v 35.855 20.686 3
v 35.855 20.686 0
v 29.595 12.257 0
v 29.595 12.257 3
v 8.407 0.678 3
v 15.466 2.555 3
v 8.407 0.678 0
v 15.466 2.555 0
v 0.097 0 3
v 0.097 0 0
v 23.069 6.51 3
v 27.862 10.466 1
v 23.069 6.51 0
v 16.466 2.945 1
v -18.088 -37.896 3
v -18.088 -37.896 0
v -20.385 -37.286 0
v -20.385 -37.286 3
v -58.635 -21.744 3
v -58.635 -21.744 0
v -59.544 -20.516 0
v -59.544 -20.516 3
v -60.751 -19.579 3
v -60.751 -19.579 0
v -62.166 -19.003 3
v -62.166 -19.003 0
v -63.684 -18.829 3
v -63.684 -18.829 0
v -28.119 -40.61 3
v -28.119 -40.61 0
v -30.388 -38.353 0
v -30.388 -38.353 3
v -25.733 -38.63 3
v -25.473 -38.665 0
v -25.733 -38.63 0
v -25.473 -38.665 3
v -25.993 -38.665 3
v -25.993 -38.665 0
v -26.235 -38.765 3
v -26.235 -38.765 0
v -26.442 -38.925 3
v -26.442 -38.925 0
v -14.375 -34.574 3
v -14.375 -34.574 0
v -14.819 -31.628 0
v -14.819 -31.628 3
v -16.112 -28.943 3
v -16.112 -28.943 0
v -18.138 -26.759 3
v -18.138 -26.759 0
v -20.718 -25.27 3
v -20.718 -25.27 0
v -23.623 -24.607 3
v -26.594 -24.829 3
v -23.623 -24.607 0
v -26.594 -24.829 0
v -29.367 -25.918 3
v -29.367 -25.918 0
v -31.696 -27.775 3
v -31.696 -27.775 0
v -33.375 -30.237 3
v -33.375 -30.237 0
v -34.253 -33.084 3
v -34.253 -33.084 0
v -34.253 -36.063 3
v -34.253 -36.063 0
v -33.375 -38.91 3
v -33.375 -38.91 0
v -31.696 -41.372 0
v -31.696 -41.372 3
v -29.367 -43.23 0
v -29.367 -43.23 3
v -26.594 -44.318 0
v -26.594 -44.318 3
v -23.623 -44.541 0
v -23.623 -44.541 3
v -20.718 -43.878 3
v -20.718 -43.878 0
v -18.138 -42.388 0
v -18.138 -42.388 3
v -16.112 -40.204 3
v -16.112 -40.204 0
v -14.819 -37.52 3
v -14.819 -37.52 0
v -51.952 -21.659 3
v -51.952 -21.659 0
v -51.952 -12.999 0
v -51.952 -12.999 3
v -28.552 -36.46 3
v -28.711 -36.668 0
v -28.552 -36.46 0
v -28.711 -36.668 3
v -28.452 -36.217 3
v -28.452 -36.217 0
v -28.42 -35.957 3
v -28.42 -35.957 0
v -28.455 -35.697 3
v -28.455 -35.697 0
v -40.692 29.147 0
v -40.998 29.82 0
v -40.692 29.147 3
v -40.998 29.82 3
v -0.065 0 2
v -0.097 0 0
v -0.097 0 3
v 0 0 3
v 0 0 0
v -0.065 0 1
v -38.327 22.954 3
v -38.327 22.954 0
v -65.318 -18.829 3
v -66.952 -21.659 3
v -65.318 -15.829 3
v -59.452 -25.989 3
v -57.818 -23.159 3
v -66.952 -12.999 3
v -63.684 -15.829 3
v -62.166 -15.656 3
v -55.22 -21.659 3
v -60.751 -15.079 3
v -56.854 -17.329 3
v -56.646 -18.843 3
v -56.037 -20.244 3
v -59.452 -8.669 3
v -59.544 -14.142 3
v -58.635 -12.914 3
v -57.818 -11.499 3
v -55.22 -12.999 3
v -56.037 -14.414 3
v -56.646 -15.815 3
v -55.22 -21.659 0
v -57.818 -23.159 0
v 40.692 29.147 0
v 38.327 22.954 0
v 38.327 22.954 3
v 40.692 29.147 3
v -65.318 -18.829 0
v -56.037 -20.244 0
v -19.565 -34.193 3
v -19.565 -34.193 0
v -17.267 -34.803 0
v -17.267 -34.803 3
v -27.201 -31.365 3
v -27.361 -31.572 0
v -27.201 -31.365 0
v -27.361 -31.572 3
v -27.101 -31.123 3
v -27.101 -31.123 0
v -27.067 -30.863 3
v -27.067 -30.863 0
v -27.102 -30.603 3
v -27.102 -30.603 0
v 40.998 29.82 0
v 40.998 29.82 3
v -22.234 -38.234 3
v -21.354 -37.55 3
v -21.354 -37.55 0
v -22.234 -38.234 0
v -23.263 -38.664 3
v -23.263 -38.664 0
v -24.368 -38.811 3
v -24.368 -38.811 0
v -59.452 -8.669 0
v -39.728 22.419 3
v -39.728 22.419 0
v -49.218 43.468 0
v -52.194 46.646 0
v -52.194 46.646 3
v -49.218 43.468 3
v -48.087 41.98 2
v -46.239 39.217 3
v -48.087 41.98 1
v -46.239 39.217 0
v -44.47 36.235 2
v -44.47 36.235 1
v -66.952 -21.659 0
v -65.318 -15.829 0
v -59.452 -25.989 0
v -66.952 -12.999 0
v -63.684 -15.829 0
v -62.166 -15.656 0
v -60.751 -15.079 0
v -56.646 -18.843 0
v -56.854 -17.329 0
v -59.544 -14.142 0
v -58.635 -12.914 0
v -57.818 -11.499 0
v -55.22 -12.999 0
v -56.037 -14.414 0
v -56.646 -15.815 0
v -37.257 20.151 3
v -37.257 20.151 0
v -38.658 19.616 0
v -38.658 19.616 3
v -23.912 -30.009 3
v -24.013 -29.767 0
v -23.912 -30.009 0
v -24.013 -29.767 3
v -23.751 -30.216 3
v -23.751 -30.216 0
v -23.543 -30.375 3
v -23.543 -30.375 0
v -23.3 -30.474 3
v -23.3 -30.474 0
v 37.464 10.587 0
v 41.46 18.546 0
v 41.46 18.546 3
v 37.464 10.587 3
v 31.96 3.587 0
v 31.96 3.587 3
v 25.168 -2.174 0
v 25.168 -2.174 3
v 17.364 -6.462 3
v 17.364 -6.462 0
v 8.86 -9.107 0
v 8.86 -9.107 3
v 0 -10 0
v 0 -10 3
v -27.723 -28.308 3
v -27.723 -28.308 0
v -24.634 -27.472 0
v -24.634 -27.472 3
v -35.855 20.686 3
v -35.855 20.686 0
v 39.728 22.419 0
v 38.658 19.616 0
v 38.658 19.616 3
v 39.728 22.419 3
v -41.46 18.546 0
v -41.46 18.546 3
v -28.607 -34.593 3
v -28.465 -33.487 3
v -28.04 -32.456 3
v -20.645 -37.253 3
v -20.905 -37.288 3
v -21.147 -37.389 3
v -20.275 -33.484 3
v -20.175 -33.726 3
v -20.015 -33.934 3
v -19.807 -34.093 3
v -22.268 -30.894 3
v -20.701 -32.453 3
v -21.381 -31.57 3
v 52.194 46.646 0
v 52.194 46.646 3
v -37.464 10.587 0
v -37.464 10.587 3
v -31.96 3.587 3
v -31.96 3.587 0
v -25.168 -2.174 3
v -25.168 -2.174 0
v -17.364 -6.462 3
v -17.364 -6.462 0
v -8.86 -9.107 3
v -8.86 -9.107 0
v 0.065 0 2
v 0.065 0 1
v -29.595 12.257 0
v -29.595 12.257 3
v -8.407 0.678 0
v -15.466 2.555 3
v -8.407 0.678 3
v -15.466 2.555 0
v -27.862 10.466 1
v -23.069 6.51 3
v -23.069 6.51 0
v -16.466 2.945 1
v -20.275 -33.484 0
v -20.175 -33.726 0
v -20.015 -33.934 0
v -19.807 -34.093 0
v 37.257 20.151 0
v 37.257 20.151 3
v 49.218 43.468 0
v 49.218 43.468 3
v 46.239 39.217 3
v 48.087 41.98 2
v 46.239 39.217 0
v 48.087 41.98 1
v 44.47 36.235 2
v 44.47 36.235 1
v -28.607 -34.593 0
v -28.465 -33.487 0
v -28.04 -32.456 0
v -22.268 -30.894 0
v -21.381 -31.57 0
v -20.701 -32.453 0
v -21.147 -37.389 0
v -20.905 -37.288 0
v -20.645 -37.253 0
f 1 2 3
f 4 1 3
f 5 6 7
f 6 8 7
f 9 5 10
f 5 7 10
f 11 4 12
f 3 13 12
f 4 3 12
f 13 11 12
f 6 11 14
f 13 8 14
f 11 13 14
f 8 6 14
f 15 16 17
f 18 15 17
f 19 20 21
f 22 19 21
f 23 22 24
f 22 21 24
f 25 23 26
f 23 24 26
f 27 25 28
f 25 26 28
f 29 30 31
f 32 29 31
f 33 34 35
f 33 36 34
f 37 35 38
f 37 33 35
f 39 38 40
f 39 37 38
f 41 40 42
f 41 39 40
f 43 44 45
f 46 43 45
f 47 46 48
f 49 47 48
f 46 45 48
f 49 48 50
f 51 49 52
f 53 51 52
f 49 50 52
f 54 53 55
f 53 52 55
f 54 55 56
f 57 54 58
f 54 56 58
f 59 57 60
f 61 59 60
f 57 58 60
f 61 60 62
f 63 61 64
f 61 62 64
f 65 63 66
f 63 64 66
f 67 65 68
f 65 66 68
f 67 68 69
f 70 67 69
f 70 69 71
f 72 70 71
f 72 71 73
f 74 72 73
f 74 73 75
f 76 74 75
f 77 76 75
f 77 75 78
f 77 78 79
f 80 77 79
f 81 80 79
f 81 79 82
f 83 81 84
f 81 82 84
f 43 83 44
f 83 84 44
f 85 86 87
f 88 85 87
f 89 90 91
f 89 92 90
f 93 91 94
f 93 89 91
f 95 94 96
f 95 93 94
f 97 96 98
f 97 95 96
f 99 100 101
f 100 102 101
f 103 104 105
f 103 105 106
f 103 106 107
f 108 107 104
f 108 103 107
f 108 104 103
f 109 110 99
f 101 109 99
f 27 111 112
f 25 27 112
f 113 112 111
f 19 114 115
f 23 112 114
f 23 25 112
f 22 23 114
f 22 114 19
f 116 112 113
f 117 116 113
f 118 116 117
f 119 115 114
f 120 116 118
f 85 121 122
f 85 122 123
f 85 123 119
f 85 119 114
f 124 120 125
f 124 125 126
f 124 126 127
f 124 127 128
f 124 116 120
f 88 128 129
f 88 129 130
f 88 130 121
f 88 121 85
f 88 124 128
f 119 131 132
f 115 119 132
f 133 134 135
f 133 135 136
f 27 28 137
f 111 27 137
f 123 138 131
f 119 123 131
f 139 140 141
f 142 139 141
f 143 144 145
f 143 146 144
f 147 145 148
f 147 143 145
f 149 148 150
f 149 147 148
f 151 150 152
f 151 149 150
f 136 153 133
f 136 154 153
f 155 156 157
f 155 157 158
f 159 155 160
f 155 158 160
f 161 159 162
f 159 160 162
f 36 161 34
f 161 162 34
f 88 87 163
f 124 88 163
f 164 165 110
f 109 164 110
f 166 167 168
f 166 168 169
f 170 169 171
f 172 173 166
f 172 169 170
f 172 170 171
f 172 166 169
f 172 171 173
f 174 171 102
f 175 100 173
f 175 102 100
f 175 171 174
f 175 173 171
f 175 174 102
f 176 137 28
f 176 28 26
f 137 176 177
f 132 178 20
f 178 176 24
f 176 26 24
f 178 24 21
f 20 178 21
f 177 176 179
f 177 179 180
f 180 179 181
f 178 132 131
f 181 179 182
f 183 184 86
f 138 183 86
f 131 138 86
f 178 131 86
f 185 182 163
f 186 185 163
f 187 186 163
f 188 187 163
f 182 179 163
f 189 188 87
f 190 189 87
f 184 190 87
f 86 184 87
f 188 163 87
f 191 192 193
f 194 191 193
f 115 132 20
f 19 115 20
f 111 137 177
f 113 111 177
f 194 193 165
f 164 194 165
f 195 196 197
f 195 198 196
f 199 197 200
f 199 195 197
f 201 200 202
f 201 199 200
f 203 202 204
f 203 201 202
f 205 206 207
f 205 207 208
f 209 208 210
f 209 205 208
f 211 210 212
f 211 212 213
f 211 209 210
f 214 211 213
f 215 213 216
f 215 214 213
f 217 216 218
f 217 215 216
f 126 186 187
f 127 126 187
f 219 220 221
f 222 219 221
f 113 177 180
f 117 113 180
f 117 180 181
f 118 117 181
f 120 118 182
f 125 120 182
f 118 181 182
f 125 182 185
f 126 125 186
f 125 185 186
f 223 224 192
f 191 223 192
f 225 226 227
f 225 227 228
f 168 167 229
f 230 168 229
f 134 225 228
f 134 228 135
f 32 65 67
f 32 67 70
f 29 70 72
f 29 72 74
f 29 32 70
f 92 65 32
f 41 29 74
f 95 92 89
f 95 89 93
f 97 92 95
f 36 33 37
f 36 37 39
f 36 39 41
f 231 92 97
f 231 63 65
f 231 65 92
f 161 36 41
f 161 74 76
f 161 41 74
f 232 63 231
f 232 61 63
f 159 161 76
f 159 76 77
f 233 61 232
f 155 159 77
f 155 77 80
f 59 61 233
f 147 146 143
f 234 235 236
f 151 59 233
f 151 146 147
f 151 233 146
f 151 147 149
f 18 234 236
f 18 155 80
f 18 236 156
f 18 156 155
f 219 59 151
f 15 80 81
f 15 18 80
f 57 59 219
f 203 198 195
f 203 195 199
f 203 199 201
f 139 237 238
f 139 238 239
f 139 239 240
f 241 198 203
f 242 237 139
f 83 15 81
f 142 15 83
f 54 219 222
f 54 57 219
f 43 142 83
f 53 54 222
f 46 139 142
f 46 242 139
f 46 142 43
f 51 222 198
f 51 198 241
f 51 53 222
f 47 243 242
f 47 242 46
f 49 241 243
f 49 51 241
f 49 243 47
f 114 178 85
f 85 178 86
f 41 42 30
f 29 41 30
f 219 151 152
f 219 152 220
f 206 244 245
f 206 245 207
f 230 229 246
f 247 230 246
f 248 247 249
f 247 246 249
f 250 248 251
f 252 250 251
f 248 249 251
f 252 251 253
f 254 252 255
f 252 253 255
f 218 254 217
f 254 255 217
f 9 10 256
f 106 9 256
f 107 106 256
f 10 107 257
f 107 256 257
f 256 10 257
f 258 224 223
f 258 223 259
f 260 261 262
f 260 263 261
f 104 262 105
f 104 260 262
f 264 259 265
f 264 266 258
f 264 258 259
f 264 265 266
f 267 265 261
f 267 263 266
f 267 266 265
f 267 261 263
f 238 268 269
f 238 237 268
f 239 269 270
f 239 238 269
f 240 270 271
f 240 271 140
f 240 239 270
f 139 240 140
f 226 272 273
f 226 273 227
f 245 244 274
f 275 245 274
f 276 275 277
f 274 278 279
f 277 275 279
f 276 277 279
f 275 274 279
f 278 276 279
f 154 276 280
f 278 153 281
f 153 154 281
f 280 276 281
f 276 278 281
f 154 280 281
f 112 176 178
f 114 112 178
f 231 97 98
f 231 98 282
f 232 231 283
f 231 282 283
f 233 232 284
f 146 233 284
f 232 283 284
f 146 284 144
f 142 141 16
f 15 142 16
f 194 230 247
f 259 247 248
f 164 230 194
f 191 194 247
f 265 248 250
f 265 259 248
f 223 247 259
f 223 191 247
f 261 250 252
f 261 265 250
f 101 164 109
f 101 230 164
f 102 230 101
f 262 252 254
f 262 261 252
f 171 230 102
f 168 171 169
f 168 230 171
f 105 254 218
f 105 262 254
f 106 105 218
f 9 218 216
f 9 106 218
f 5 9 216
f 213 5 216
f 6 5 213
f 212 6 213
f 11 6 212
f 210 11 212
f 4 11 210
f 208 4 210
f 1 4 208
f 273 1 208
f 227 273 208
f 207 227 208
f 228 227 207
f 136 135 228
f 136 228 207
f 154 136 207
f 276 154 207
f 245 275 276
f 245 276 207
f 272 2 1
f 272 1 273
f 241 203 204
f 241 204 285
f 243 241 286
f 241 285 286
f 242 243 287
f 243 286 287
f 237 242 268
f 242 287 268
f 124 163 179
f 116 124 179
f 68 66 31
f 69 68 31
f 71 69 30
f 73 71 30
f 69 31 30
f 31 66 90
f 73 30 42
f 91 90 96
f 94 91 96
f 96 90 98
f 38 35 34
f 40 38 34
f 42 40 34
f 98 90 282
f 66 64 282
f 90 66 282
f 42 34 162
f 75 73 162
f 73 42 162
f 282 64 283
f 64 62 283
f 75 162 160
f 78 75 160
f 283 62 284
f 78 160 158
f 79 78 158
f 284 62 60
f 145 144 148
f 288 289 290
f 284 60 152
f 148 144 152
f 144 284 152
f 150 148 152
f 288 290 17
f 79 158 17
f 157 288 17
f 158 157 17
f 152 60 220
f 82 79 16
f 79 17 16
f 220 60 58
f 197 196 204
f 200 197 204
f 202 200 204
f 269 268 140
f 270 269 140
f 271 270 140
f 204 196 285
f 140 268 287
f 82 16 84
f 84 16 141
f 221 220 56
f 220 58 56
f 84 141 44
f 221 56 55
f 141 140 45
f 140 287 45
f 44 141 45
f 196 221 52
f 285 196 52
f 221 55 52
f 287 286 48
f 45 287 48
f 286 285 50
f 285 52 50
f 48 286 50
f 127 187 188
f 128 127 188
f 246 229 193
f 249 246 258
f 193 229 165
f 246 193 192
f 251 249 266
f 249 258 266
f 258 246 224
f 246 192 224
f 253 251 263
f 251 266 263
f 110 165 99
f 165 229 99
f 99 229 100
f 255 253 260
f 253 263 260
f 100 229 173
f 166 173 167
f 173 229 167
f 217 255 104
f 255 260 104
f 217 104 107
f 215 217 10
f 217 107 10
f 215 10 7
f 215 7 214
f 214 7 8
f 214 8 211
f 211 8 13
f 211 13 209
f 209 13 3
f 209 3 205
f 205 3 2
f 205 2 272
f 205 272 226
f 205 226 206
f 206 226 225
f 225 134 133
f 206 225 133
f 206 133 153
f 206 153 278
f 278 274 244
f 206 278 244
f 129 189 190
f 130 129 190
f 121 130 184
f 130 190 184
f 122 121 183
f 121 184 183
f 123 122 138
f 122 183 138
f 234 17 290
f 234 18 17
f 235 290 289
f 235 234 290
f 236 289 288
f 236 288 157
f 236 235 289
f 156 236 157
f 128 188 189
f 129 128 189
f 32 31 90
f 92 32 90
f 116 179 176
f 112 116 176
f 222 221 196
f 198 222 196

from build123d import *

# Parameters (mm, degrees)
F1_DEPTH = 3
F2_R     = 6
F5_DEPTH = 3
F6_R     = 9.9948698969
F7_DEPTH = 3
F8_R     = 1


with BuildPart() as f1:
    # F0 (on Top) → F1 (new body)
    with BuildSketch(Plane.XY):
        with BuildLine():
            add(Edge.make_bspline(
                [(-52.1936073571, 46.6457645564), (-47.6554851248, 42.5900153585), (-44.4048403776, 36.2283632752), (-40.8247886844, 29.4929830615)],
                knots=[0, 0, 0, 0, 22.7977816795, 22.7977816795, 22.7977816795, 22.7977816795], degree=3))
            Line((-52.1936073571, 46.6457645564), (-41.4603734854, 18.5455618145))
            ThreePointArc((-41.4603734854, 18.5455618145), (-25.1684905629, -2.1735358695), (0, -10))
            Line((0, -10), (0, 0))
            add(Edge.make_bspline(
                [(-0.0969811924, 8.0723e-05), (-0.0646814008, 2.69207e-05), (-0.0323543475, 0), (0, 0)],
                knots=[69.9378881624, 69.9378881624, 69.9378881624, 69.9378881624, 70, 70, 70, 70], degree=3))
            add(Edge.make_bspline(
                [(-35.8553334484, 20.6864789506), (-29.041090153, 9.7405323449), (-19.4753714242, 0.0323596164), (-0.0969811924, 8.0723e-05)],
                knots=[32.6736407865, 32.6736407865, 32.6736407865, 32.6736407865, 69.9378881624, 69.9378881624, 69.9378881624, 69.9378881624], degree=3))
            Line((-35.8553334484, 20.6864789506), (-37.2565934576, 20.1512496665))
            Line((-37.2565934576, 20.1512496665), (-38.6578534669, 19.6160203825))
            Line((-38.6578534669, 19.6160203825), (-39.7283120349, 22.418540401))
            Line((-39.7283120349, 22.418540401), (-38.3270520257, 22.953769685))
            Line((-38.3270520257, 22.953769685), (-40.8247886844, 29.4929830615))
        make_face()
    extrude(amount=F1_DEPTH)

    # F2
    f2_edges = [f1.edges().sort_by_distance(p)[0] for p in [
        (-40.824789, 29.492983, 1.5),
    ]]
    fillet(f2_edges, radius=F2_R)

    # F3: F1 across face


with BuildPart() as f1_1:
    add(f1.part)
    add(f1.part.mirror(Plane(origin=(0, -5, 1.5), x_dir=(0, 1, 0), z_dir=(1, 0, 0))))


with BuildPart() as f5:
    # F4 (on Top) → F5 (new body)
    with BuildSketch(Plane.XY):
        Polygon((-51.952010545, -12.999056554), (-59.452010545, -8.6689295351), (-66.952010545, -12.999056554), (-66.952010545, -21.6593105919), (-59.452010545, -25.9894376108), (-51.952010545, -21.6593105919), align=None)
        with BuildLine():
            ThreePointArc((-63.6840613526, -15.829183573), (-60.7510486507, -15.079183573), (-58.6350232469, -12.9141200635))
            Line((-58.6350232469, -12.9141200635), (-57.8180359488, -11.499056554))
            Line((-57.8180359488, -11.499056554), (-55.2199597374, -12.999056554))
            Line((-55.2199597374, -12.999056554), (-56.0369470355, -14.4141200635))
            ThreePointArc((-56.0369470355, -14.4141200635), (-56.8539343336, -17.329183573), (-56.0369470355, -20.2442470824))
            Line((-56.0369470355, -20.2442470824), (-55.2199597374, -21.6593105919))
            Line((-55.2199597374, -21.6593105919), (-57.8180359488, -23.1593105919))
            Line((-57.8180359488, -23.1593105919), (-58.6350232469, -21.7442470824))
            ThreePointArc((-58.6350232469, -21.7442470824), (-60.7510486507, -19.579183573), (-63.6840613526, -18.829183573))
            Line((-63.6840613526, -18.829183573), (-65.3180359488, -18.829183573))
            Line((-65.3180359488, -18.829183573), (-65.3180359488, -15.829183573))
            Line((-65.3180359488, -15.829183573), (-63.6840613526, -15.829183573))
        make_face(mode=Mode.SUBTRACT)
    extrude(amount=F5_DEPTH)


with BuildPart() as f7:
    # F6 (on Top) → F7 (new body)
    with BuildSketch(Plane.XY):
        with Locations((-24.3696505876, -34.5736941158)):
            Circle(F6_R)
        Polygon((-22.319488679, -26.8461601743), (-16.6523289313, -32.4854194397), (-17.2671143966, -34.8026879101), (-18.0877053746, -37.8956849109), (-18.7024908399, -40.2129533813), (-26.4198124961, -42.3012280573), (-28.1192331262, -40.6101739913), (-30.3875516137, -38.3530228579), (-32.0869722438, -36.6619687919), (-30.0368103352, -28.9344348503), (-27.7226042399, -28.308220446), (-24.6336947744, -27.4723745786), align=None, mode=Mode.SUBTRACT)
        with BuildLine():
            Line((-26.9389987392, -31.2040730699), (-27.7226042399, -28.308220446))
            Line((-27.7226042399, -28.308220446), (-30.0368103352, -28.9344348503))
            Line((-30.0368103352, -28.9344348503), (-32.0869722438, -36.6619687919))
            Line((-32.0869722438, -36.6619687919), (-30.3875516137, -38.3530228579))
            Line((-30.3875516137, -38.3530228579), (-28.2714724262, -36.2264742758))
            ThreePointArc((-28.2714724262, -36.2264742758), (-28.4653970066, -33.4870675983), (-26.9389987392, -31.2040730699))
        make_face()
        with BuildLine():
            Line((-17.2671143966, -34.8026879101), (-16.6523289313, -32.4854194397))
            Line((-16.6523289313, -32.4854194397), (-22.319488679, -26.8461601743))
            Line((-22.319488679, -26.8461601743), (-24.6336947744, -27.4723745786))
            Line((-24.6336947744, -27.4723745786), (-23.8500892737, -30.3682272025))
            ThreePointArc((-23.8500892737, -30.3682272025), (-21.3807312095, -31.5699869282), (-20.1667990848, -34.0333838683))
            Line((-20.1667990848, -34.0333838683), (-17.2671143966, -34.8026879101))
        make_face()
        with BuildLine():
            Line((-18.7024908399, -40.2129533813), (-18.0877053746, -37.8956849109))
            Line((-18.0877053746, -37.8956849109), (-20.9873900628, -37.126380869))
            ThreePointArc((-20.9873900628, -37.126380869), (-23.2628235466, -38.6640278209), (-26.0031539386, -38.4836254093))
            Line((-26.0031539386, -38.4836254093), (-28.1192331262, -40.6101739913))
            Line((-28.1192331262, -40.6101739913), (-26.4198124961, -42.3012280573))
            Line((-26.4198124961, -42.3012280573), (-18.7024908399, -40.2129533813))
        make_face()
    extrude(amount=F7_DEPTH)

    # F8
    f8_edges = [f7.edges().sort_by_distance(p)[0] for p in [
        (-20.166799, -34.033384, 1.5),
        (-23.850089, -30.368227, 1.5),
        (-26.938999, -31.204073, 1.5),
        (-28.271472, -36.226474, 1.5),
        (-26.003154, -38.483625, 1.5),
        (-20.98739, -37.126381, 1.5),
    ]]
    fillet(f8_edges, radius=F8_R)


solid = Compound([f1_1.part, f5.part, f7.part])
